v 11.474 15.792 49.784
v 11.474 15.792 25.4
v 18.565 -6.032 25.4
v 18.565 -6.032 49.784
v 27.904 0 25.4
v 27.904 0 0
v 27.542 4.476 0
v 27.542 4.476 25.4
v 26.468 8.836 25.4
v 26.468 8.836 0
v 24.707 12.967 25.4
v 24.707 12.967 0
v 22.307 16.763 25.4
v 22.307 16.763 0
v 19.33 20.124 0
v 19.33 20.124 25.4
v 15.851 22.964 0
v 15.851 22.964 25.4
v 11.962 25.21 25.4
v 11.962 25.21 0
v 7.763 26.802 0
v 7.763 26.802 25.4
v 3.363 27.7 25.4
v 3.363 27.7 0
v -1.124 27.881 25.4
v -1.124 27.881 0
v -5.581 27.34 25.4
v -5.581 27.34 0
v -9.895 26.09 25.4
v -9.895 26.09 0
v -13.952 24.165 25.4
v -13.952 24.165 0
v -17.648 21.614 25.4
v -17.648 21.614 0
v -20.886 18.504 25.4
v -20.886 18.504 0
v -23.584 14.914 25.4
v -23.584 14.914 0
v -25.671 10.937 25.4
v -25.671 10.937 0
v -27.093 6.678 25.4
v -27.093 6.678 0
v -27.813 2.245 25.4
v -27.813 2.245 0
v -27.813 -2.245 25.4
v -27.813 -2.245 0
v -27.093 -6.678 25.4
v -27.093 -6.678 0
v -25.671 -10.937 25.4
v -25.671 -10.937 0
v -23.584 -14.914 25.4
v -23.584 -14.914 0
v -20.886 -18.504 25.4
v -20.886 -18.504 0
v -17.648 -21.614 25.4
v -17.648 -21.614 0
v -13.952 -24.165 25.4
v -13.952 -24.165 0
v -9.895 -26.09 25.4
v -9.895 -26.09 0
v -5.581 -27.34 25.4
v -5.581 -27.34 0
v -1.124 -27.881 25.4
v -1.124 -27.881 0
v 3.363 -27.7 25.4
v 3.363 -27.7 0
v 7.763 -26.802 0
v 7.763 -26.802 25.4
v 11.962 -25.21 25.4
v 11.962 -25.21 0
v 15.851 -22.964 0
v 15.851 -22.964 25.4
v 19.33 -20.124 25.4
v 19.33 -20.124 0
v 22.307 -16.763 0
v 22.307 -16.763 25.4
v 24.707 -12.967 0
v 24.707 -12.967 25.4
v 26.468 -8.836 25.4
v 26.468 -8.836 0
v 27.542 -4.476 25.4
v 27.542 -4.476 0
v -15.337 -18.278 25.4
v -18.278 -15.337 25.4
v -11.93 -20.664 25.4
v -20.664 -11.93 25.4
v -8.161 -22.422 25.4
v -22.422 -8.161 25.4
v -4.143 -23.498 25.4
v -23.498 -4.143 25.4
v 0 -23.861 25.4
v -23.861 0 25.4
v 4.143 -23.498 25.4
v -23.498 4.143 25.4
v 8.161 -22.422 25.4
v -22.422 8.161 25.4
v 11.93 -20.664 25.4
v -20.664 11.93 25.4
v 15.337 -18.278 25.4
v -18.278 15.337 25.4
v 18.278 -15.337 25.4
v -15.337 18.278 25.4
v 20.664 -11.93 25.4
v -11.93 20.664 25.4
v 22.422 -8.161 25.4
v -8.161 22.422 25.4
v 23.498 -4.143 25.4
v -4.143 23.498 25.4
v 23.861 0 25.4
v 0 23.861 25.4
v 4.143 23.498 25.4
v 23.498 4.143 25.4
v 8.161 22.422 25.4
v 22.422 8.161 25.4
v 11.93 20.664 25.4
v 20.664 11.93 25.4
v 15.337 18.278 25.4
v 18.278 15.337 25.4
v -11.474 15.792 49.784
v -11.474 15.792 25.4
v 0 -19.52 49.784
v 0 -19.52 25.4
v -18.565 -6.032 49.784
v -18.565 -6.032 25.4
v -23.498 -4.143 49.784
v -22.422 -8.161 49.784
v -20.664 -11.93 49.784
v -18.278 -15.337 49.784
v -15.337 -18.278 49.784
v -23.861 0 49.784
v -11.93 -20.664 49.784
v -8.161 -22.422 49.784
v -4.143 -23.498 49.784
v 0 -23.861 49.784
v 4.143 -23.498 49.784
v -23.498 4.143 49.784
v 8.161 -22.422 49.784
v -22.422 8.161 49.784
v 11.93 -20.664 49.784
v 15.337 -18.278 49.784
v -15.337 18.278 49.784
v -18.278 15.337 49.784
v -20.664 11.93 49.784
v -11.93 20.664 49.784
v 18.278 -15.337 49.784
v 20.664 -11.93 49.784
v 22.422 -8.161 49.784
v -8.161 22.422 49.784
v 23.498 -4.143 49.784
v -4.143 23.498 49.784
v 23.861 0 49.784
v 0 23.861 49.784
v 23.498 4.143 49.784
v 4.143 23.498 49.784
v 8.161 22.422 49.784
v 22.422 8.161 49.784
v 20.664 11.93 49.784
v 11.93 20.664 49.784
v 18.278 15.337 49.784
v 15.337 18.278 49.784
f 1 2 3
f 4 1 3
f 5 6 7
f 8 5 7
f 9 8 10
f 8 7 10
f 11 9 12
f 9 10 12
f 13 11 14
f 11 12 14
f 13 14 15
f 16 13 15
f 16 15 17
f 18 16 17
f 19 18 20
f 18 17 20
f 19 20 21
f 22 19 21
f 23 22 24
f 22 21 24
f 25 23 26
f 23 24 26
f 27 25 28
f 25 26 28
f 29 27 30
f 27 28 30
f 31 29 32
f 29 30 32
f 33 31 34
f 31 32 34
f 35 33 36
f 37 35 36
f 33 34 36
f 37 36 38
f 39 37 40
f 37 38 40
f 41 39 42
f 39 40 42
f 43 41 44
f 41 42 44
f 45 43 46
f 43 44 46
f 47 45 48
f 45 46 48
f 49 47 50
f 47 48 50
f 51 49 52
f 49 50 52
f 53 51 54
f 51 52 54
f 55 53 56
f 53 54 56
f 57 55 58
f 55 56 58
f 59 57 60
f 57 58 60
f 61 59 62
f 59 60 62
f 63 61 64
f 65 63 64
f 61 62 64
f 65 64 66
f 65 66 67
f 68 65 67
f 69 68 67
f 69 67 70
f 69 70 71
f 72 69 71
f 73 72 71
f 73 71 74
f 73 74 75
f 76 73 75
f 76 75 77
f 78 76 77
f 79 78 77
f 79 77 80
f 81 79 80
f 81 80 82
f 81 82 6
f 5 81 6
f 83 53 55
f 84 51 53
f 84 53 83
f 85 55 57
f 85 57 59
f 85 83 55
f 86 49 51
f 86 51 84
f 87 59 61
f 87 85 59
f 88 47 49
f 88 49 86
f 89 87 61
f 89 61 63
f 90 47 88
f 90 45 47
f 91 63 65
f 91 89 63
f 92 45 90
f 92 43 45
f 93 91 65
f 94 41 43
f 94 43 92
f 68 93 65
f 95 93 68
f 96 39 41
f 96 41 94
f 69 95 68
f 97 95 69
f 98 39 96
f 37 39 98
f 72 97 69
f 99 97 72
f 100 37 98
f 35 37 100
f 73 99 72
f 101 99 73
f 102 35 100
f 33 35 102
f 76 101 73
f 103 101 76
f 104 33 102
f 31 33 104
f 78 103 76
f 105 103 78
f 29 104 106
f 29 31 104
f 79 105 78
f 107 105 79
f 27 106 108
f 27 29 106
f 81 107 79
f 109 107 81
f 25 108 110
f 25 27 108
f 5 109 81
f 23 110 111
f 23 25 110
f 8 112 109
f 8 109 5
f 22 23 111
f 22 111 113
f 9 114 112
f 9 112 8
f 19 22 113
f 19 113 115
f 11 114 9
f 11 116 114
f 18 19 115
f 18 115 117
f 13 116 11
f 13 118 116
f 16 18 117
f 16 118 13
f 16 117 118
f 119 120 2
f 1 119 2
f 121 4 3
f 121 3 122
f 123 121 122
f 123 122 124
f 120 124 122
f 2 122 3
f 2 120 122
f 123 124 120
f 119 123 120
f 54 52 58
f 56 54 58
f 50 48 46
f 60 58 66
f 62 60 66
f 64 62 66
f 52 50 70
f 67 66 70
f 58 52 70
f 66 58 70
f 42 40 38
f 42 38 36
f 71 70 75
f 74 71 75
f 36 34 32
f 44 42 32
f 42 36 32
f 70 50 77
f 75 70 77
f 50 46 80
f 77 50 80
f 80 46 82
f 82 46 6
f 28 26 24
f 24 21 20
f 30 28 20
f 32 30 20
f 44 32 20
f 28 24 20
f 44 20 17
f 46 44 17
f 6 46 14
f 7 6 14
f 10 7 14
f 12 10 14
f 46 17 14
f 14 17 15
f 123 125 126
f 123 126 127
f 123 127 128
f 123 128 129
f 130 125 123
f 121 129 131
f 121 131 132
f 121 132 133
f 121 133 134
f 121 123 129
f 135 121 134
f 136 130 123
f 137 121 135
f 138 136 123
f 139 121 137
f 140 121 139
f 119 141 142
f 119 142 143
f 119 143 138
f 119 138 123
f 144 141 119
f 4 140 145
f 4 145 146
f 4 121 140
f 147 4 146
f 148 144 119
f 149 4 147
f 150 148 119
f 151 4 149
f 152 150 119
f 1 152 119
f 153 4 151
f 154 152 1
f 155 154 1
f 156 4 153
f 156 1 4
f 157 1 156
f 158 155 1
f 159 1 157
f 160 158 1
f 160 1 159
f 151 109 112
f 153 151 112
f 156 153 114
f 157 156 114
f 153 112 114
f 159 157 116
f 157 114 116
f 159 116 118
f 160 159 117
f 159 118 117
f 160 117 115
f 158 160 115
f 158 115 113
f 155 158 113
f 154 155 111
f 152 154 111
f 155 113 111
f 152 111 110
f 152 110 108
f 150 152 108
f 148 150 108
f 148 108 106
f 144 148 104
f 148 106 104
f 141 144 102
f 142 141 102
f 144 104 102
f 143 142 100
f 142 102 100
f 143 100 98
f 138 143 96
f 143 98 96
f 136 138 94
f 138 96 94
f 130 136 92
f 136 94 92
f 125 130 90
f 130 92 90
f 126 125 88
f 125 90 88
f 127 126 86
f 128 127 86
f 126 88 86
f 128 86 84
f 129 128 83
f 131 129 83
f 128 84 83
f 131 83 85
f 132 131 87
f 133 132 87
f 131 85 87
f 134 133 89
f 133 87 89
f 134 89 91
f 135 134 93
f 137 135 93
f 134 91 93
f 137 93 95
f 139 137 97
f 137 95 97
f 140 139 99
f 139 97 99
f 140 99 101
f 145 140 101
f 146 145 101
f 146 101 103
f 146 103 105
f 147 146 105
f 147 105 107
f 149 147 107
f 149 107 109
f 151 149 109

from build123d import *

# Parameters (mm, degrees)
F0_R     = 27.903603
F1_DEPTH = 25.4
F2_R     = 23.860723
F3_DEPTH = 24.384


with BuildPart() as f1:
    # F0 (on Top) → F1 (new body)
    with BuildSketch(Plane.XY):
        Circle(F0_R)
    extrude(amount=F1_DEPTH)

    # F2 (on face) → F3 (join)
    with BuildSketch(Plane.XY.offset(25.4)):
        Circle(F2_R)
        Polygon((-18.564959, -6.032121), (-11.473776, 15.792297), (11.473776, 15.792297), (18.564959, -6.032121), (0, -19.520353), align=None, mode=Mode.SUBTRACT)
    extrude(amount=F3_DEPTH)


solid = f1.part
